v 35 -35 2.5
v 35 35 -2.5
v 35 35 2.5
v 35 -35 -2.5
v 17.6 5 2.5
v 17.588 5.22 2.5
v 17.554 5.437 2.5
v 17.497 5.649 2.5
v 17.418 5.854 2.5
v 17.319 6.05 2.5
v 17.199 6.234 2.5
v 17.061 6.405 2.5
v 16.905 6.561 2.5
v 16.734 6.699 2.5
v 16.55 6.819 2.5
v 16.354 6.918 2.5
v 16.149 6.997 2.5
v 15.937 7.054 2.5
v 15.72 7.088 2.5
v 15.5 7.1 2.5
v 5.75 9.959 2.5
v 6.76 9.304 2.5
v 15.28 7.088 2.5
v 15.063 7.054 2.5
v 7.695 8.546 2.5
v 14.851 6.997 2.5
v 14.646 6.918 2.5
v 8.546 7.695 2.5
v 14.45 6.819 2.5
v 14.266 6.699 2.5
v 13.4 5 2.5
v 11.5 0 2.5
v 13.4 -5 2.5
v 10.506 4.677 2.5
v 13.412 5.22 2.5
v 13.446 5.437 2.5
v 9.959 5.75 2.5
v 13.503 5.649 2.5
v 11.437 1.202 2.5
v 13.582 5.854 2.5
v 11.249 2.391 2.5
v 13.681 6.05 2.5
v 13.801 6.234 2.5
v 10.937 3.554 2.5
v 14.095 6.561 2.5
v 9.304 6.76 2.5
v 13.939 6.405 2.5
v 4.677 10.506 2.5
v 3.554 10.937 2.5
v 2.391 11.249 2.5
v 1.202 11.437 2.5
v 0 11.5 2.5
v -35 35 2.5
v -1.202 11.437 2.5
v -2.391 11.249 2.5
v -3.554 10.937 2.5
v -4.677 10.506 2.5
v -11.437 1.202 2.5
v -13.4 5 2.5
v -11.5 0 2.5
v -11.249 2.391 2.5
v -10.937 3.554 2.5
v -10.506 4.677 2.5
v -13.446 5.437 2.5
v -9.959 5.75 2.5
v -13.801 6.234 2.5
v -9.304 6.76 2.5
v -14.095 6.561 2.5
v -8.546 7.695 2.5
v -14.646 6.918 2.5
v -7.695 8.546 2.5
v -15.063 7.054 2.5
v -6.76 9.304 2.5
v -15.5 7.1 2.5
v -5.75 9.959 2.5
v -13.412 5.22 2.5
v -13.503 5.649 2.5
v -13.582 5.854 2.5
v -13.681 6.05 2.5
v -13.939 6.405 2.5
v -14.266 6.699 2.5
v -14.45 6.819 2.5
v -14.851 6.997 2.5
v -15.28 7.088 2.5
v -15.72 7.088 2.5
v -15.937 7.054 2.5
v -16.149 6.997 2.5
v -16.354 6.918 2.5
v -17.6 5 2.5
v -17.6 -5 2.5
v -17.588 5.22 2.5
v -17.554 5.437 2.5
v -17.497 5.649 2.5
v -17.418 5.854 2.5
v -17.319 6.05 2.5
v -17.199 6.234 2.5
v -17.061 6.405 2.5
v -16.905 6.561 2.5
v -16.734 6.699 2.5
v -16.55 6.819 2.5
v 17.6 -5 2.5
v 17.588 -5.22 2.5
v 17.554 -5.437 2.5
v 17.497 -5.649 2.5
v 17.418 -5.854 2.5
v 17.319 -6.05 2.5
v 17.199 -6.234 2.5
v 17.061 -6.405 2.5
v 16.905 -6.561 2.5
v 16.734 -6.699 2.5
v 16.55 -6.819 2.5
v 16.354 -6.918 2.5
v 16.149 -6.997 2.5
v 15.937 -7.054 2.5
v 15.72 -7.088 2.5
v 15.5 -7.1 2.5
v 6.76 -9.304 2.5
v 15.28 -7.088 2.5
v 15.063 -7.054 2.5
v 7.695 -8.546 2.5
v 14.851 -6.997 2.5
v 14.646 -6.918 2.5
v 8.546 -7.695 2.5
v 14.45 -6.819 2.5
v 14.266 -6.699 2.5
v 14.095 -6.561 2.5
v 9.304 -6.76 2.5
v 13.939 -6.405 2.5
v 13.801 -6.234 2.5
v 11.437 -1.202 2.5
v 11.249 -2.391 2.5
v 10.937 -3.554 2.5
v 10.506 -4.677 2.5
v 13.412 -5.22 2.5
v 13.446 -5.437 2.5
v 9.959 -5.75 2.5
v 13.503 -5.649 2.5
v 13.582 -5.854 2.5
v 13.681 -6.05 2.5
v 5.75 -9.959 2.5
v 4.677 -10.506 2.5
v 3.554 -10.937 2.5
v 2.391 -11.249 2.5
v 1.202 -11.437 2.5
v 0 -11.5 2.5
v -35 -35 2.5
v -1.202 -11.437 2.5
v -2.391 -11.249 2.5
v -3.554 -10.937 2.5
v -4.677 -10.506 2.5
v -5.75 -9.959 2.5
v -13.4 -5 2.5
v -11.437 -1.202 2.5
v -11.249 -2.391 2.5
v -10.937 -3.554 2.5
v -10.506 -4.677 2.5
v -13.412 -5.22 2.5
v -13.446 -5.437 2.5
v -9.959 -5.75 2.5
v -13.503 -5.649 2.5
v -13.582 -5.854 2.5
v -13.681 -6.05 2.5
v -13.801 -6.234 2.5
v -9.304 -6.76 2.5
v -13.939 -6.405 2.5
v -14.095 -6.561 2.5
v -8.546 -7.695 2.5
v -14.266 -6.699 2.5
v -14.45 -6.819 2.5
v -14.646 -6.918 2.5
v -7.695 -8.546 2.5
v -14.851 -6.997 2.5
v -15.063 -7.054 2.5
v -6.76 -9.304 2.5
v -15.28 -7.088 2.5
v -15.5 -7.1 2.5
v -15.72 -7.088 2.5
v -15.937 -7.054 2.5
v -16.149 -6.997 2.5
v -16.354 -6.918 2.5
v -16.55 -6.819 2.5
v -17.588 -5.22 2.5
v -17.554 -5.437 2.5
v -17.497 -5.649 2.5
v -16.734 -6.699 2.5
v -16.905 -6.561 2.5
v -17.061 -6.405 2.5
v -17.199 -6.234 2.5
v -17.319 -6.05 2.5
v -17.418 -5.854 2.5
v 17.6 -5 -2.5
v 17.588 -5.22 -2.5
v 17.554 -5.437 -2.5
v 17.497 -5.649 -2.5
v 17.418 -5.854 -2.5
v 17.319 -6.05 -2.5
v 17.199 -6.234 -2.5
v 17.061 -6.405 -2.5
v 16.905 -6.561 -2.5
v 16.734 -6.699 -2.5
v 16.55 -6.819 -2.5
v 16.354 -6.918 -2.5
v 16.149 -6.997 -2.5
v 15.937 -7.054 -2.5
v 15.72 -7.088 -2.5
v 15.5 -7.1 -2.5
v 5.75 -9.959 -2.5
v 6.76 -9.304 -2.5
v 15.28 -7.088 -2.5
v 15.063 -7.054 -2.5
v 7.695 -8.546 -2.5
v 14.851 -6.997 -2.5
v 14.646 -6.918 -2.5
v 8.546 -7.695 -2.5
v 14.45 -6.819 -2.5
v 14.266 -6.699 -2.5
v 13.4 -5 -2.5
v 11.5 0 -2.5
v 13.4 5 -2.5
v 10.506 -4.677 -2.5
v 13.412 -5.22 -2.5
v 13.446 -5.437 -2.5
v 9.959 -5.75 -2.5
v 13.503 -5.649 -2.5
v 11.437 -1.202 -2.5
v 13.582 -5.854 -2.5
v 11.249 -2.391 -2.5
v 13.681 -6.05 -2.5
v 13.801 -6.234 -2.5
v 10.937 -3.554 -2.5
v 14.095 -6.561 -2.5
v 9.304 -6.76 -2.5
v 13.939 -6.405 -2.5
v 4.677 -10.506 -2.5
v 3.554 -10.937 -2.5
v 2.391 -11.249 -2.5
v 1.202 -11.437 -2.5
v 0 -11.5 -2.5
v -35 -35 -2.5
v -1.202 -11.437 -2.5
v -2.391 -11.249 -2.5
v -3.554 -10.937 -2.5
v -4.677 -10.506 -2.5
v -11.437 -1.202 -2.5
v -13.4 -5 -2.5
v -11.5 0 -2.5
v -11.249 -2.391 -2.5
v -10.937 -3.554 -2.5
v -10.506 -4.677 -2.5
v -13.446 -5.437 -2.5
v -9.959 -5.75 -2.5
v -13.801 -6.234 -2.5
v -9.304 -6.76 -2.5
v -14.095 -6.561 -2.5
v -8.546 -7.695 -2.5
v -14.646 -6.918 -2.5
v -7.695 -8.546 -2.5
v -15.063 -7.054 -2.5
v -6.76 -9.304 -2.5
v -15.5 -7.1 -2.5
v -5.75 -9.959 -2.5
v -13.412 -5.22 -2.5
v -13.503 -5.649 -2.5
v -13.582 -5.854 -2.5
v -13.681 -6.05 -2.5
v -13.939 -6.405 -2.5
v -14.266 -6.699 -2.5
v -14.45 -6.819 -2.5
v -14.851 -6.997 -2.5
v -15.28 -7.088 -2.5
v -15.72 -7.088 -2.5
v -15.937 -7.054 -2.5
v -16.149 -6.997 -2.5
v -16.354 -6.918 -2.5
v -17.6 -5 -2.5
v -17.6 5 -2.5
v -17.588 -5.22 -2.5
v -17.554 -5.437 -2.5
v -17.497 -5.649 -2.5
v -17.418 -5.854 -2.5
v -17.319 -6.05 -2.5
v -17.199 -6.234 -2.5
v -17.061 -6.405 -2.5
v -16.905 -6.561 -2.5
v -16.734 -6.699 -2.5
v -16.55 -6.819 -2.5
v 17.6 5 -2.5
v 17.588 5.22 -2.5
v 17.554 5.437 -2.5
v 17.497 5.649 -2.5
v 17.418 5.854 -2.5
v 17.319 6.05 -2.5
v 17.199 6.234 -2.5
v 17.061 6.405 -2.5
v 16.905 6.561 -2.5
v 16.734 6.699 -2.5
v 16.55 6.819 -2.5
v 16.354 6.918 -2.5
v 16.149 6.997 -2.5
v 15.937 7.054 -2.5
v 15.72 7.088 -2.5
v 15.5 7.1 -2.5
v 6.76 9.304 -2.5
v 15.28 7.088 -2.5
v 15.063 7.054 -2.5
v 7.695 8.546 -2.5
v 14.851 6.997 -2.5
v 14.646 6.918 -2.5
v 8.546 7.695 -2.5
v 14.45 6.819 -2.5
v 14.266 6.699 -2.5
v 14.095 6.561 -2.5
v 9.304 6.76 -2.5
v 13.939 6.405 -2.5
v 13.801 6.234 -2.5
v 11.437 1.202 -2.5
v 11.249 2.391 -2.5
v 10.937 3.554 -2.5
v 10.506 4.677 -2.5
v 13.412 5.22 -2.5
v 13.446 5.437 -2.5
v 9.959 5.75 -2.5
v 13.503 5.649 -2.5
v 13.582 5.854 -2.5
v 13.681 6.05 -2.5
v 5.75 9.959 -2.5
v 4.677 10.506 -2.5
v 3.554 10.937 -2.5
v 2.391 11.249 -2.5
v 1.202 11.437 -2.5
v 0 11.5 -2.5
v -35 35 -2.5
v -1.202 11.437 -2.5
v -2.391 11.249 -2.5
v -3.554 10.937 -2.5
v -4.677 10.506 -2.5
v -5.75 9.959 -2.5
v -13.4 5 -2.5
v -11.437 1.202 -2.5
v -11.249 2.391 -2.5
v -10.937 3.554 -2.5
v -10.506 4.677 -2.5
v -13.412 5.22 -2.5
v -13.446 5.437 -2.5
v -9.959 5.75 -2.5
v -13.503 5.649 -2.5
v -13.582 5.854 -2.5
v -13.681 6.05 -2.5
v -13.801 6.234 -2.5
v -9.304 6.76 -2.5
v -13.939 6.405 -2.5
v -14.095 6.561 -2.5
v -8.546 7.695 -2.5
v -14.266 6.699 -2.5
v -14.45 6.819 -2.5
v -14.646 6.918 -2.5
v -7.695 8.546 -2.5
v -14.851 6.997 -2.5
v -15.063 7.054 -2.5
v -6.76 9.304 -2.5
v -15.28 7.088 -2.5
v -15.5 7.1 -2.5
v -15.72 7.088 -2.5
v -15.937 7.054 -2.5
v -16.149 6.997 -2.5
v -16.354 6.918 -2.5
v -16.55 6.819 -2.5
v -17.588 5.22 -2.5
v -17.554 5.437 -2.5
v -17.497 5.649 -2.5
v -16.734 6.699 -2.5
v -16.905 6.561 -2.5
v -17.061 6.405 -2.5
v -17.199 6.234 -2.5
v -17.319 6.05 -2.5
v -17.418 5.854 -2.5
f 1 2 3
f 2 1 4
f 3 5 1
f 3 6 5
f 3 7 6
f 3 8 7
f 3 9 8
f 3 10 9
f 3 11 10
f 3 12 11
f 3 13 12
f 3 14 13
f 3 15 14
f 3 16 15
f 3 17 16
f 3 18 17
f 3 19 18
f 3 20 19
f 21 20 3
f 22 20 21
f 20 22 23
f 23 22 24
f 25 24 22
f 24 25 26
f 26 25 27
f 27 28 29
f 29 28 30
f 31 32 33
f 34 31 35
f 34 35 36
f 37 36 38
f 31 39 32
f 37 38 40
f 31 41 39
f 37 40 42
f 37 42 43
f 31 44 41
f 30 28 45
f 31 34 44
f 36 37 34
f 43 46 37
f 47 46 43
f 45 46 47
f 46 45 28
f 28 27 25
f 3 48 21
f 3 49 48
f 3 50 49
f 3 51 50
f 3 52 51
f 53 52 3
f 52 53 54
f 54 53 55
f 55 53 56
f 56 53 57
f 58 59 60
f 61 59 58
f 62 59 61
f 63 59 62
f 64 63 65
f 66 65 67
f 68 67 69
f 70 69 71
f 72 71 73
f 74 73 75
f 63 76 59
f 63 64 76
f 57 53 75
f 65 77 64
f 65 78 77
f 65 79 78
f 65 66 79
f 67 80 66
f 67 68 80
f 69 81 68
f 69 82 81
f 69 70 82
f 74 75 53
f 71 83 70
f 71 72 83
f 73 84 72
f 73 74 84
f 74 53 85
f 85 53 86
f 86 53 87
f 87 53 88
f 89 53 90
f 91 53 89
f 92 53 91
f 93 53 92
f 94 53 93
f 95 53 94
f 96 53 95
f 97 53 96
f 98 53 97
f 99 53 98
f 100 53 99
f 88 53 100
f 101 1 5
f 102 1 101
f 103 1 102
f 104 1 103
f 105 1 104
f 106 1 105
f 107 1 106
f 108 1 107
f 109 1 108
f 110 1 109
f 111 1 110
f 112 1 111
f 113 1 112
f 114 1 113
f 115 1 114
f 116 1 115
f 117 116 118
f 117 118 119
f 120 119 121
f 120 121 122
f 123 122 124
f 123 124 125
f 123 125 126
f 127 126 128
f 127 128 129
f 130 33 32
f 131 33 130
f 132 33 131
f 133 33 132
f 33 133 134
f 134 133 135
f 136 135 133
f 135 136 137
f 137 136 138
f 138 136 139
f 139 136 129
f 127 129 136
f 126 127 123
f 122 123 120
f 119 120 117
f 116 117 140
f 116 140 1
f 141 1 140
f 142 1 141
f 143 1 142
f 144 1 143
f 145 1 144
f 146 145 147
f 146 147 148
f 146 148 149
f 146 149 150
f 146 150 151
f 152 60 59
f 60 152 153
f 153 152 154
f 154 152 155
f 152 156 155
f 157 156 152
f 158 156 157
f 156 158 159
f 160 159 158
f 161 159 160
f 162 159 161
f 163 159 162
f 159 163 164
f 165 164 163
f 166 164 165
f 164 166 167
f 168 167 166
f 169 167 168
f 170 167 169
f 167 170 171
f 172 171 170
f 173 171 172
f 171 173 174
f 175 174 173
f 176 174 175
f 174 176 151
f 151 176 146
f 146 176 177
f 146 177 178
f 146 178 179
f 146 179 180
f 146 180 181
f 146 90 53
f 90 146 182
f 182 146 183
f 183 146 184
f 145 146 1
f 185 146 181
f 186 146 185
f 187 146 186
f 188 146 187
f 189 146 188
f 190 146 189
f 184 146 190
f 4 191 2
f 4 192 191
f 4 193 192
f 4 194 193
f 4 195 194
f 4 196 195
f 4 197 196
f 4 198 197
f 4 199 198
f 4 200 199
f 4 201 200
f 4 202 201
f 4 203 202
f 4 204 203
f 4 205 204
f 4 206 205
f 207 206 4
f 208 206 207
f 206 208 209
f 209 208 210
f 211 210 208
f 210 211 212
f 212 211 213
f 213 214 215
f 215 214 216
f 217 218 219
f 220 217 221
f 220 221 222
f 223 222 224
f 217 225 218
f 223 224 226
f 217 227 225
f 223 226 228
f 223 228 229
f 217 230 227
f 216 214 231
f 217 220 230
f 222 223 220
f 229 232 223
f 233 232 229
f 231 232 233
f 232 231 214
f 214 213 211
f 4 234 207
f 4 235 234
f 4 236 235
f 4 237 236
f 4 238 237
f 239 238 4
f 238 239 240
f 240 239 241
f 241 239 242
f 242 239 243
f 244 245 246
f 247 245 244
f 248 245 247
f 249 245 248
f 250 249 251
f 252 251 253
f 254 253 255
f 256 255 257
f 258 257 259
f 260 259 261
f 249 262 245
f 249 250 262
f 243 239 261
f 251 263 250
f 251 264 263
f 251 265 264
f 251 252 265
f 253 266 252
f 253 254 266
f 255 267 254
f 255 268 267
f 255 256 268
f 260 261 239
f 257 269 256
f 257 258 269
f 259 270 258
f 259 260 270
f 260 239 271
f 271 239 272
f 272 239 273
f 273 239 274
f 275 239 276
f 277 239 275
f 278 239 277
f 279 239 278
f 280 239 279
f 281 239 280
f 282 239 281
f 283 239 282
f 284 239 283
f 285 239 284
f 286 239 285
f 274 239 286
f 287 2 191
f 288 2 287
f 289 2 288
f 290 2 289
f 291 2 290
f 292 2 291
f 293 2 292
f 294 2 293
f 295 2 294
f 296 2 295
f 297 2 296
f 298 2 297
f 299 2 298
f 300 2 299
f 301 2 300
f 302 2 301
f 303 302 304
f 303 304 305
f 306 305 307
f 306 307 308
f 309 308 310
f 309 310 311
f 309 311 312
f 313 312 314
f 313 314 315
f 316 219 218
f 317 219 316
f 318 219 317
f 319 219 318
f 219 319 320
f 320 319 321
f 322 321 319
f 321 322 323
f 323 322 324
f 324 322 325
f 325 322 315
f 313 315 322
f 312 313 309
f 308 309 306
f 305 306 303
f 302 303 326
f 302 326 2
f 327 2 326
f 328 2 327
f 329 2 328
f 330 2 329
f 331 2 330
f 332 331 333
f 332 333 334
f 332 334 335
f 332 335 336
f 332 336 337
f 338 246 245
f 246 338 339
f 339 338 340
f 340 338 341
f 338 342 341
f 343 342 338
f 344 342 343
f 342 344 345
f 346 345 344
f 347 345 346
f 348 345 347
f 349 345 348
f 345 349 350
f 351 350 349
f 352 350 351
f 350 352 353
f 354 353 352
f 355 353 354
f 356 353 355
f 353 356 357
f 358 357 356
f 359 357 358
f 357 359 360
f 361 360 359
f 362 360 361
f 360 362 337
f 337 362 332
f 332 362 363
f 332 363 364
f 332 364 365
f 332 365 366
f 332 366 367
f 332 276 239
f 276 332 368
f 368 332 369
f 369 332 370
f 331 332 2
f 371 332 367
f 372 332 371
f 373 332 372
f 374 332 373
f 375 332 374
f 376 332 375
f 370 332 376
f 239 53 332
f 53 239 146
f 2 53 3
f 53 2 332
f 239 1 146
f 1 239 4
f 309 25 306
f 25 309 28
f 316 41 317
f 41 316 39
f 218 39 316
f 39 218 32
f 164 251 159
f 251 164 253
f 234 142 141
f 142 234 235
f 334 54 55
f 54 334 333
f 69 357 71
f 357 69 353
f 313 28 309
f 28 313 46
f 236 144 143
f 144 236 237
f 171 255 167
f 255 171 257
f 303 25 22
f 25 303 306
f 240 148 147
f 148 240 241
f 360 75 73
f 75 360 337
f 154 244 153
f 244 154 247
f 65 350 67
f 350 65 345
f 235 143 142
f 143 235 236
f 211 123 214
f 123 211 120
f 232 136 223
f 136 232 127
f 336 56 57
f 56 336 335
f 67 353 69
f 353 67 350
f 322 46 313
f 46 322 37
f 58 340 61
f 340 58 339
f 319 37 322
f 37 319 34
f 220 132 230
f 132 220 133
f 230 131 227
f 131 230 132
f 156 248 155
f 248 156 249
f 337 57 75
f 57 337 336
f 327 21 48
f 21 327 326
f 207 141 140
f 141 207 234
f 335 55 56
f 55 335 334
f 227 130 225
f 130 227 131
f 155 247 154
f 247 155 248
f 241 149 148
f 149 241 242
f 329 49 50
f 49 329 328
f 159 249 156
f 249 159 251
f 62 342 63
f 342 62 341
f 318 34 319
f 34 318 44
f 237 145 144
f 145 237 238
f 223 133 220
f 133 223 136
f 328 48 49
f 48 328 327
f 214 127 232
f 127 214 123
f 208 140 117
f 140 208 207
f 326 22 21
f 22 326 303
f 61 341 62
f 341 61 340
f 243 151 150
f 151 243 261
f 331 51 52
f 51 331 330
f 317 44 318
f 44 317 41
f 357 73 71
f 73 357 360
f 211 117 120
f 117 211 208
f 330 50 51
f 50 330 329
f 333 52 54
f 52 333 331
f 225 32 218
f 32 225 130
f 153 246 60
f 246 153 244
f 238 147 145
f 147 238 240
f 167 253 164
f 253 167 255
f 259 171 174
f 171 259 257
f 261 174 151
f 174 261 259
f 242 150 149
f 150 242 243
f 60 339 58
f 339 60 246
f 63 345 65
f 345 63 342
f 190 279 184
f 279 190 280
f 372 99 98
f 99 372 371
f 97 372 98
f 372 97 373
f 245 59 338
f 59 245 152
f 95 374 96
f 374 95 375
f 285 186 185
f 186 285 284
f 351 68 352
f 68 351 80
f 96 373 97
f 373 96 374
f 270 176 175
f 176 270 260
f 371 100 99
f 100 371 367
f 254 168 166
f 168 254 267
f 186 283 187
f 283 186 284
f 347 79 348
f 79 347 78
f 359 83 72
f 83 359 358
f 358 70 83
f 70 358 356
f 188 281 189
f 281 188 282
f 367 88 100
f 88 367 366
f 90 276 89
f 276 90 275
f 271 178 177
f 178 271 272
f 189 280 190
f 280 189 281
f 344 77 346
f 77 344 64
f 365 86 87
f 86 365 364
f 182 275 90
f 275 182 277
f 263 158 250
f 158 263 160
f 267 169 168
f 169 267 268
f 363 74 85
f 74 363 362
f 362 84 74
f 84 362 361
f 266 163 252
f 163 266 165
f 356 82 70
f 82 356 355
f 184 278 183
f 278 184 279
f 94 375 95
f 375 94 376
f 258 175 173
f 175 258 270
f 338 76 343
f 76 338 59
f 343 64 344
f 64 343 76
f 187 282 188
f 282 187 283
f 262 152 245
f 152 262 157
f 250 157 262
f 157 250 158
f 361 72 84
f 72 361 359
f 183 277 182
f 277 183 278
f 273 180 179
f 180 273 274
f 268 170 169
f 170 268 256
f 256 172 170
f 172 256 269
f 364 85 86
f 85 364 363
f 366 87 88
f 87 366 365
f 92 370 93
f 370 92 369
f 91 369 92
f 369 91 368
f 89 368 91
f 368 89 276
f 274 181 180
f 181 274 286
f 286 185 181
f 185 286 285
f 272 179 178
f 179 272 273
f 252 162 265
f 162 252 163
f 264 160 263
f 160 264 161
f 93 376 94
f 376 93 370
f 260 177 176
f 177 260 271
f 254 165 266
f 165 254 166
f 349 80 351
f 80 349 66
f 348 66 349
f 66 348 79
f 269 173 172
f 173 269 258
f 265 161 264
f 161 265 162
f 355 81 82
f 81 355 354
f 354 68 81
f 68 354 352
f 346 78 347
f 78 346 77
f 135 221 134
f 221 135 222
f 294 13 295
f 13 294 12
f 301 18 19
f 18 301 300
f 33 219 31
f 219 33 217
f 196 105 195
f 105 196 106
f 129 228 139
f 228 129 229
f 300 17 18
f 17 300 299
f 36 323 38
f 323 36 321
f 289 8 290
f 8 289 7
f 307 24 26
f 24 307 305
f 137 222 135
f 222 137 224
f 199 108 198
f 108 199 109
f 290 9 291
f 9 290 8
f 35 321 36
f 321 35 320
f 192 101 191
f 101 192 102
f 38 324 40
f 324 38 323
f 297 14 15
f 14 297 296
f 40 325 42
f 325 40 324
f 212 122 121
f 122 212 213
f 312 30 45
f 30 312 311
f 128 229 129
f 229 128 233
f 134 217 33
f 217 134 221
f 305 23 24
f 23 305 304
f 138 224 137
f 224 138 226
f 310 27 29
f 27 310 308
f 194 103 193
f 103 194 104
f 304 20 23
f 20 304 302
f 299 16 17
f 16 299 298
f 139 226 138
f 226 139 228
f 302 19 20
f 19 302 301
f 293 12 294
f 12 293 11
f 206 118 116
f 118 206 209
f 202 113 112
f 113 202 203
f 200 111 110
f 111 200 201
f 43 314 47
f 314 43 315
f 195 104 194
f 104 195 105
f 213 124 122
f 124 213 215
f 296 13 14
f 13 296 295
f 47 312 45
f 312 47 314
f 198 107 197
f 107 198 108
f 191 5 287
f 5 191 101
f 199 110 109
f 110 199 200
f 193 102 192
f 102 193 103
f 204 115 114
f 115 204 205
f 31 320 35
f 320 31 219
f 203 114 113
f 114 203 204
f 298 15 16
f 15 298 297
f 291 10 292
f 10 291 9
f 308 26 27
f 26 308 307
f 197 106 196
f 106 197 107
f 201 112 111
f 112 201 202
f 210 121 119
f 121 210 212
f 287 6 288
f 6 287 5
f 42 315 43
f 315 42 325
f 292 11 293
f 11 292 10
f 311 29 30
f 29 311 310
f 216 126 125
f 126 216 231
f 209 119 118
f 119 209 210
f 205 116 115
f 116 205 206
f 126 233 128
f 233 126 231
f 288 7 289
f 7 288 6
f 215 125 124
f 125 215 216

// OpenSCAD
// NEMA 17 adjustable motor plate, 70 mm square.
$fn = 60;
eps = 0.02;
plate = 70;
plate_t = 5;
hole_pitch = 31;
center_d = 23;
slot_l = 10;
slot_d = 4.2;
module slot(x) {
    hull() {
        translate([x, -slot_l / 2, -plate_t / 2 - eps]) cylinder(d = slot_d, h = plate_t + 2 * eps);
        translate([x, slot_l / 2, -plate_t / 2 - eps]) cylinder(d = slot_d, h = plate_t + 2 * eps);
    }
}
difference() {
    cube([plate, plate, plate_t], center = true);
    translate([0, 0, -plate_t / 2 - eps]) cylinder(d = center_d, h = plate_t + 2 * eps);
    slot(-hole_pitch / 2);
    slot(hole_pitch / 2);
}
